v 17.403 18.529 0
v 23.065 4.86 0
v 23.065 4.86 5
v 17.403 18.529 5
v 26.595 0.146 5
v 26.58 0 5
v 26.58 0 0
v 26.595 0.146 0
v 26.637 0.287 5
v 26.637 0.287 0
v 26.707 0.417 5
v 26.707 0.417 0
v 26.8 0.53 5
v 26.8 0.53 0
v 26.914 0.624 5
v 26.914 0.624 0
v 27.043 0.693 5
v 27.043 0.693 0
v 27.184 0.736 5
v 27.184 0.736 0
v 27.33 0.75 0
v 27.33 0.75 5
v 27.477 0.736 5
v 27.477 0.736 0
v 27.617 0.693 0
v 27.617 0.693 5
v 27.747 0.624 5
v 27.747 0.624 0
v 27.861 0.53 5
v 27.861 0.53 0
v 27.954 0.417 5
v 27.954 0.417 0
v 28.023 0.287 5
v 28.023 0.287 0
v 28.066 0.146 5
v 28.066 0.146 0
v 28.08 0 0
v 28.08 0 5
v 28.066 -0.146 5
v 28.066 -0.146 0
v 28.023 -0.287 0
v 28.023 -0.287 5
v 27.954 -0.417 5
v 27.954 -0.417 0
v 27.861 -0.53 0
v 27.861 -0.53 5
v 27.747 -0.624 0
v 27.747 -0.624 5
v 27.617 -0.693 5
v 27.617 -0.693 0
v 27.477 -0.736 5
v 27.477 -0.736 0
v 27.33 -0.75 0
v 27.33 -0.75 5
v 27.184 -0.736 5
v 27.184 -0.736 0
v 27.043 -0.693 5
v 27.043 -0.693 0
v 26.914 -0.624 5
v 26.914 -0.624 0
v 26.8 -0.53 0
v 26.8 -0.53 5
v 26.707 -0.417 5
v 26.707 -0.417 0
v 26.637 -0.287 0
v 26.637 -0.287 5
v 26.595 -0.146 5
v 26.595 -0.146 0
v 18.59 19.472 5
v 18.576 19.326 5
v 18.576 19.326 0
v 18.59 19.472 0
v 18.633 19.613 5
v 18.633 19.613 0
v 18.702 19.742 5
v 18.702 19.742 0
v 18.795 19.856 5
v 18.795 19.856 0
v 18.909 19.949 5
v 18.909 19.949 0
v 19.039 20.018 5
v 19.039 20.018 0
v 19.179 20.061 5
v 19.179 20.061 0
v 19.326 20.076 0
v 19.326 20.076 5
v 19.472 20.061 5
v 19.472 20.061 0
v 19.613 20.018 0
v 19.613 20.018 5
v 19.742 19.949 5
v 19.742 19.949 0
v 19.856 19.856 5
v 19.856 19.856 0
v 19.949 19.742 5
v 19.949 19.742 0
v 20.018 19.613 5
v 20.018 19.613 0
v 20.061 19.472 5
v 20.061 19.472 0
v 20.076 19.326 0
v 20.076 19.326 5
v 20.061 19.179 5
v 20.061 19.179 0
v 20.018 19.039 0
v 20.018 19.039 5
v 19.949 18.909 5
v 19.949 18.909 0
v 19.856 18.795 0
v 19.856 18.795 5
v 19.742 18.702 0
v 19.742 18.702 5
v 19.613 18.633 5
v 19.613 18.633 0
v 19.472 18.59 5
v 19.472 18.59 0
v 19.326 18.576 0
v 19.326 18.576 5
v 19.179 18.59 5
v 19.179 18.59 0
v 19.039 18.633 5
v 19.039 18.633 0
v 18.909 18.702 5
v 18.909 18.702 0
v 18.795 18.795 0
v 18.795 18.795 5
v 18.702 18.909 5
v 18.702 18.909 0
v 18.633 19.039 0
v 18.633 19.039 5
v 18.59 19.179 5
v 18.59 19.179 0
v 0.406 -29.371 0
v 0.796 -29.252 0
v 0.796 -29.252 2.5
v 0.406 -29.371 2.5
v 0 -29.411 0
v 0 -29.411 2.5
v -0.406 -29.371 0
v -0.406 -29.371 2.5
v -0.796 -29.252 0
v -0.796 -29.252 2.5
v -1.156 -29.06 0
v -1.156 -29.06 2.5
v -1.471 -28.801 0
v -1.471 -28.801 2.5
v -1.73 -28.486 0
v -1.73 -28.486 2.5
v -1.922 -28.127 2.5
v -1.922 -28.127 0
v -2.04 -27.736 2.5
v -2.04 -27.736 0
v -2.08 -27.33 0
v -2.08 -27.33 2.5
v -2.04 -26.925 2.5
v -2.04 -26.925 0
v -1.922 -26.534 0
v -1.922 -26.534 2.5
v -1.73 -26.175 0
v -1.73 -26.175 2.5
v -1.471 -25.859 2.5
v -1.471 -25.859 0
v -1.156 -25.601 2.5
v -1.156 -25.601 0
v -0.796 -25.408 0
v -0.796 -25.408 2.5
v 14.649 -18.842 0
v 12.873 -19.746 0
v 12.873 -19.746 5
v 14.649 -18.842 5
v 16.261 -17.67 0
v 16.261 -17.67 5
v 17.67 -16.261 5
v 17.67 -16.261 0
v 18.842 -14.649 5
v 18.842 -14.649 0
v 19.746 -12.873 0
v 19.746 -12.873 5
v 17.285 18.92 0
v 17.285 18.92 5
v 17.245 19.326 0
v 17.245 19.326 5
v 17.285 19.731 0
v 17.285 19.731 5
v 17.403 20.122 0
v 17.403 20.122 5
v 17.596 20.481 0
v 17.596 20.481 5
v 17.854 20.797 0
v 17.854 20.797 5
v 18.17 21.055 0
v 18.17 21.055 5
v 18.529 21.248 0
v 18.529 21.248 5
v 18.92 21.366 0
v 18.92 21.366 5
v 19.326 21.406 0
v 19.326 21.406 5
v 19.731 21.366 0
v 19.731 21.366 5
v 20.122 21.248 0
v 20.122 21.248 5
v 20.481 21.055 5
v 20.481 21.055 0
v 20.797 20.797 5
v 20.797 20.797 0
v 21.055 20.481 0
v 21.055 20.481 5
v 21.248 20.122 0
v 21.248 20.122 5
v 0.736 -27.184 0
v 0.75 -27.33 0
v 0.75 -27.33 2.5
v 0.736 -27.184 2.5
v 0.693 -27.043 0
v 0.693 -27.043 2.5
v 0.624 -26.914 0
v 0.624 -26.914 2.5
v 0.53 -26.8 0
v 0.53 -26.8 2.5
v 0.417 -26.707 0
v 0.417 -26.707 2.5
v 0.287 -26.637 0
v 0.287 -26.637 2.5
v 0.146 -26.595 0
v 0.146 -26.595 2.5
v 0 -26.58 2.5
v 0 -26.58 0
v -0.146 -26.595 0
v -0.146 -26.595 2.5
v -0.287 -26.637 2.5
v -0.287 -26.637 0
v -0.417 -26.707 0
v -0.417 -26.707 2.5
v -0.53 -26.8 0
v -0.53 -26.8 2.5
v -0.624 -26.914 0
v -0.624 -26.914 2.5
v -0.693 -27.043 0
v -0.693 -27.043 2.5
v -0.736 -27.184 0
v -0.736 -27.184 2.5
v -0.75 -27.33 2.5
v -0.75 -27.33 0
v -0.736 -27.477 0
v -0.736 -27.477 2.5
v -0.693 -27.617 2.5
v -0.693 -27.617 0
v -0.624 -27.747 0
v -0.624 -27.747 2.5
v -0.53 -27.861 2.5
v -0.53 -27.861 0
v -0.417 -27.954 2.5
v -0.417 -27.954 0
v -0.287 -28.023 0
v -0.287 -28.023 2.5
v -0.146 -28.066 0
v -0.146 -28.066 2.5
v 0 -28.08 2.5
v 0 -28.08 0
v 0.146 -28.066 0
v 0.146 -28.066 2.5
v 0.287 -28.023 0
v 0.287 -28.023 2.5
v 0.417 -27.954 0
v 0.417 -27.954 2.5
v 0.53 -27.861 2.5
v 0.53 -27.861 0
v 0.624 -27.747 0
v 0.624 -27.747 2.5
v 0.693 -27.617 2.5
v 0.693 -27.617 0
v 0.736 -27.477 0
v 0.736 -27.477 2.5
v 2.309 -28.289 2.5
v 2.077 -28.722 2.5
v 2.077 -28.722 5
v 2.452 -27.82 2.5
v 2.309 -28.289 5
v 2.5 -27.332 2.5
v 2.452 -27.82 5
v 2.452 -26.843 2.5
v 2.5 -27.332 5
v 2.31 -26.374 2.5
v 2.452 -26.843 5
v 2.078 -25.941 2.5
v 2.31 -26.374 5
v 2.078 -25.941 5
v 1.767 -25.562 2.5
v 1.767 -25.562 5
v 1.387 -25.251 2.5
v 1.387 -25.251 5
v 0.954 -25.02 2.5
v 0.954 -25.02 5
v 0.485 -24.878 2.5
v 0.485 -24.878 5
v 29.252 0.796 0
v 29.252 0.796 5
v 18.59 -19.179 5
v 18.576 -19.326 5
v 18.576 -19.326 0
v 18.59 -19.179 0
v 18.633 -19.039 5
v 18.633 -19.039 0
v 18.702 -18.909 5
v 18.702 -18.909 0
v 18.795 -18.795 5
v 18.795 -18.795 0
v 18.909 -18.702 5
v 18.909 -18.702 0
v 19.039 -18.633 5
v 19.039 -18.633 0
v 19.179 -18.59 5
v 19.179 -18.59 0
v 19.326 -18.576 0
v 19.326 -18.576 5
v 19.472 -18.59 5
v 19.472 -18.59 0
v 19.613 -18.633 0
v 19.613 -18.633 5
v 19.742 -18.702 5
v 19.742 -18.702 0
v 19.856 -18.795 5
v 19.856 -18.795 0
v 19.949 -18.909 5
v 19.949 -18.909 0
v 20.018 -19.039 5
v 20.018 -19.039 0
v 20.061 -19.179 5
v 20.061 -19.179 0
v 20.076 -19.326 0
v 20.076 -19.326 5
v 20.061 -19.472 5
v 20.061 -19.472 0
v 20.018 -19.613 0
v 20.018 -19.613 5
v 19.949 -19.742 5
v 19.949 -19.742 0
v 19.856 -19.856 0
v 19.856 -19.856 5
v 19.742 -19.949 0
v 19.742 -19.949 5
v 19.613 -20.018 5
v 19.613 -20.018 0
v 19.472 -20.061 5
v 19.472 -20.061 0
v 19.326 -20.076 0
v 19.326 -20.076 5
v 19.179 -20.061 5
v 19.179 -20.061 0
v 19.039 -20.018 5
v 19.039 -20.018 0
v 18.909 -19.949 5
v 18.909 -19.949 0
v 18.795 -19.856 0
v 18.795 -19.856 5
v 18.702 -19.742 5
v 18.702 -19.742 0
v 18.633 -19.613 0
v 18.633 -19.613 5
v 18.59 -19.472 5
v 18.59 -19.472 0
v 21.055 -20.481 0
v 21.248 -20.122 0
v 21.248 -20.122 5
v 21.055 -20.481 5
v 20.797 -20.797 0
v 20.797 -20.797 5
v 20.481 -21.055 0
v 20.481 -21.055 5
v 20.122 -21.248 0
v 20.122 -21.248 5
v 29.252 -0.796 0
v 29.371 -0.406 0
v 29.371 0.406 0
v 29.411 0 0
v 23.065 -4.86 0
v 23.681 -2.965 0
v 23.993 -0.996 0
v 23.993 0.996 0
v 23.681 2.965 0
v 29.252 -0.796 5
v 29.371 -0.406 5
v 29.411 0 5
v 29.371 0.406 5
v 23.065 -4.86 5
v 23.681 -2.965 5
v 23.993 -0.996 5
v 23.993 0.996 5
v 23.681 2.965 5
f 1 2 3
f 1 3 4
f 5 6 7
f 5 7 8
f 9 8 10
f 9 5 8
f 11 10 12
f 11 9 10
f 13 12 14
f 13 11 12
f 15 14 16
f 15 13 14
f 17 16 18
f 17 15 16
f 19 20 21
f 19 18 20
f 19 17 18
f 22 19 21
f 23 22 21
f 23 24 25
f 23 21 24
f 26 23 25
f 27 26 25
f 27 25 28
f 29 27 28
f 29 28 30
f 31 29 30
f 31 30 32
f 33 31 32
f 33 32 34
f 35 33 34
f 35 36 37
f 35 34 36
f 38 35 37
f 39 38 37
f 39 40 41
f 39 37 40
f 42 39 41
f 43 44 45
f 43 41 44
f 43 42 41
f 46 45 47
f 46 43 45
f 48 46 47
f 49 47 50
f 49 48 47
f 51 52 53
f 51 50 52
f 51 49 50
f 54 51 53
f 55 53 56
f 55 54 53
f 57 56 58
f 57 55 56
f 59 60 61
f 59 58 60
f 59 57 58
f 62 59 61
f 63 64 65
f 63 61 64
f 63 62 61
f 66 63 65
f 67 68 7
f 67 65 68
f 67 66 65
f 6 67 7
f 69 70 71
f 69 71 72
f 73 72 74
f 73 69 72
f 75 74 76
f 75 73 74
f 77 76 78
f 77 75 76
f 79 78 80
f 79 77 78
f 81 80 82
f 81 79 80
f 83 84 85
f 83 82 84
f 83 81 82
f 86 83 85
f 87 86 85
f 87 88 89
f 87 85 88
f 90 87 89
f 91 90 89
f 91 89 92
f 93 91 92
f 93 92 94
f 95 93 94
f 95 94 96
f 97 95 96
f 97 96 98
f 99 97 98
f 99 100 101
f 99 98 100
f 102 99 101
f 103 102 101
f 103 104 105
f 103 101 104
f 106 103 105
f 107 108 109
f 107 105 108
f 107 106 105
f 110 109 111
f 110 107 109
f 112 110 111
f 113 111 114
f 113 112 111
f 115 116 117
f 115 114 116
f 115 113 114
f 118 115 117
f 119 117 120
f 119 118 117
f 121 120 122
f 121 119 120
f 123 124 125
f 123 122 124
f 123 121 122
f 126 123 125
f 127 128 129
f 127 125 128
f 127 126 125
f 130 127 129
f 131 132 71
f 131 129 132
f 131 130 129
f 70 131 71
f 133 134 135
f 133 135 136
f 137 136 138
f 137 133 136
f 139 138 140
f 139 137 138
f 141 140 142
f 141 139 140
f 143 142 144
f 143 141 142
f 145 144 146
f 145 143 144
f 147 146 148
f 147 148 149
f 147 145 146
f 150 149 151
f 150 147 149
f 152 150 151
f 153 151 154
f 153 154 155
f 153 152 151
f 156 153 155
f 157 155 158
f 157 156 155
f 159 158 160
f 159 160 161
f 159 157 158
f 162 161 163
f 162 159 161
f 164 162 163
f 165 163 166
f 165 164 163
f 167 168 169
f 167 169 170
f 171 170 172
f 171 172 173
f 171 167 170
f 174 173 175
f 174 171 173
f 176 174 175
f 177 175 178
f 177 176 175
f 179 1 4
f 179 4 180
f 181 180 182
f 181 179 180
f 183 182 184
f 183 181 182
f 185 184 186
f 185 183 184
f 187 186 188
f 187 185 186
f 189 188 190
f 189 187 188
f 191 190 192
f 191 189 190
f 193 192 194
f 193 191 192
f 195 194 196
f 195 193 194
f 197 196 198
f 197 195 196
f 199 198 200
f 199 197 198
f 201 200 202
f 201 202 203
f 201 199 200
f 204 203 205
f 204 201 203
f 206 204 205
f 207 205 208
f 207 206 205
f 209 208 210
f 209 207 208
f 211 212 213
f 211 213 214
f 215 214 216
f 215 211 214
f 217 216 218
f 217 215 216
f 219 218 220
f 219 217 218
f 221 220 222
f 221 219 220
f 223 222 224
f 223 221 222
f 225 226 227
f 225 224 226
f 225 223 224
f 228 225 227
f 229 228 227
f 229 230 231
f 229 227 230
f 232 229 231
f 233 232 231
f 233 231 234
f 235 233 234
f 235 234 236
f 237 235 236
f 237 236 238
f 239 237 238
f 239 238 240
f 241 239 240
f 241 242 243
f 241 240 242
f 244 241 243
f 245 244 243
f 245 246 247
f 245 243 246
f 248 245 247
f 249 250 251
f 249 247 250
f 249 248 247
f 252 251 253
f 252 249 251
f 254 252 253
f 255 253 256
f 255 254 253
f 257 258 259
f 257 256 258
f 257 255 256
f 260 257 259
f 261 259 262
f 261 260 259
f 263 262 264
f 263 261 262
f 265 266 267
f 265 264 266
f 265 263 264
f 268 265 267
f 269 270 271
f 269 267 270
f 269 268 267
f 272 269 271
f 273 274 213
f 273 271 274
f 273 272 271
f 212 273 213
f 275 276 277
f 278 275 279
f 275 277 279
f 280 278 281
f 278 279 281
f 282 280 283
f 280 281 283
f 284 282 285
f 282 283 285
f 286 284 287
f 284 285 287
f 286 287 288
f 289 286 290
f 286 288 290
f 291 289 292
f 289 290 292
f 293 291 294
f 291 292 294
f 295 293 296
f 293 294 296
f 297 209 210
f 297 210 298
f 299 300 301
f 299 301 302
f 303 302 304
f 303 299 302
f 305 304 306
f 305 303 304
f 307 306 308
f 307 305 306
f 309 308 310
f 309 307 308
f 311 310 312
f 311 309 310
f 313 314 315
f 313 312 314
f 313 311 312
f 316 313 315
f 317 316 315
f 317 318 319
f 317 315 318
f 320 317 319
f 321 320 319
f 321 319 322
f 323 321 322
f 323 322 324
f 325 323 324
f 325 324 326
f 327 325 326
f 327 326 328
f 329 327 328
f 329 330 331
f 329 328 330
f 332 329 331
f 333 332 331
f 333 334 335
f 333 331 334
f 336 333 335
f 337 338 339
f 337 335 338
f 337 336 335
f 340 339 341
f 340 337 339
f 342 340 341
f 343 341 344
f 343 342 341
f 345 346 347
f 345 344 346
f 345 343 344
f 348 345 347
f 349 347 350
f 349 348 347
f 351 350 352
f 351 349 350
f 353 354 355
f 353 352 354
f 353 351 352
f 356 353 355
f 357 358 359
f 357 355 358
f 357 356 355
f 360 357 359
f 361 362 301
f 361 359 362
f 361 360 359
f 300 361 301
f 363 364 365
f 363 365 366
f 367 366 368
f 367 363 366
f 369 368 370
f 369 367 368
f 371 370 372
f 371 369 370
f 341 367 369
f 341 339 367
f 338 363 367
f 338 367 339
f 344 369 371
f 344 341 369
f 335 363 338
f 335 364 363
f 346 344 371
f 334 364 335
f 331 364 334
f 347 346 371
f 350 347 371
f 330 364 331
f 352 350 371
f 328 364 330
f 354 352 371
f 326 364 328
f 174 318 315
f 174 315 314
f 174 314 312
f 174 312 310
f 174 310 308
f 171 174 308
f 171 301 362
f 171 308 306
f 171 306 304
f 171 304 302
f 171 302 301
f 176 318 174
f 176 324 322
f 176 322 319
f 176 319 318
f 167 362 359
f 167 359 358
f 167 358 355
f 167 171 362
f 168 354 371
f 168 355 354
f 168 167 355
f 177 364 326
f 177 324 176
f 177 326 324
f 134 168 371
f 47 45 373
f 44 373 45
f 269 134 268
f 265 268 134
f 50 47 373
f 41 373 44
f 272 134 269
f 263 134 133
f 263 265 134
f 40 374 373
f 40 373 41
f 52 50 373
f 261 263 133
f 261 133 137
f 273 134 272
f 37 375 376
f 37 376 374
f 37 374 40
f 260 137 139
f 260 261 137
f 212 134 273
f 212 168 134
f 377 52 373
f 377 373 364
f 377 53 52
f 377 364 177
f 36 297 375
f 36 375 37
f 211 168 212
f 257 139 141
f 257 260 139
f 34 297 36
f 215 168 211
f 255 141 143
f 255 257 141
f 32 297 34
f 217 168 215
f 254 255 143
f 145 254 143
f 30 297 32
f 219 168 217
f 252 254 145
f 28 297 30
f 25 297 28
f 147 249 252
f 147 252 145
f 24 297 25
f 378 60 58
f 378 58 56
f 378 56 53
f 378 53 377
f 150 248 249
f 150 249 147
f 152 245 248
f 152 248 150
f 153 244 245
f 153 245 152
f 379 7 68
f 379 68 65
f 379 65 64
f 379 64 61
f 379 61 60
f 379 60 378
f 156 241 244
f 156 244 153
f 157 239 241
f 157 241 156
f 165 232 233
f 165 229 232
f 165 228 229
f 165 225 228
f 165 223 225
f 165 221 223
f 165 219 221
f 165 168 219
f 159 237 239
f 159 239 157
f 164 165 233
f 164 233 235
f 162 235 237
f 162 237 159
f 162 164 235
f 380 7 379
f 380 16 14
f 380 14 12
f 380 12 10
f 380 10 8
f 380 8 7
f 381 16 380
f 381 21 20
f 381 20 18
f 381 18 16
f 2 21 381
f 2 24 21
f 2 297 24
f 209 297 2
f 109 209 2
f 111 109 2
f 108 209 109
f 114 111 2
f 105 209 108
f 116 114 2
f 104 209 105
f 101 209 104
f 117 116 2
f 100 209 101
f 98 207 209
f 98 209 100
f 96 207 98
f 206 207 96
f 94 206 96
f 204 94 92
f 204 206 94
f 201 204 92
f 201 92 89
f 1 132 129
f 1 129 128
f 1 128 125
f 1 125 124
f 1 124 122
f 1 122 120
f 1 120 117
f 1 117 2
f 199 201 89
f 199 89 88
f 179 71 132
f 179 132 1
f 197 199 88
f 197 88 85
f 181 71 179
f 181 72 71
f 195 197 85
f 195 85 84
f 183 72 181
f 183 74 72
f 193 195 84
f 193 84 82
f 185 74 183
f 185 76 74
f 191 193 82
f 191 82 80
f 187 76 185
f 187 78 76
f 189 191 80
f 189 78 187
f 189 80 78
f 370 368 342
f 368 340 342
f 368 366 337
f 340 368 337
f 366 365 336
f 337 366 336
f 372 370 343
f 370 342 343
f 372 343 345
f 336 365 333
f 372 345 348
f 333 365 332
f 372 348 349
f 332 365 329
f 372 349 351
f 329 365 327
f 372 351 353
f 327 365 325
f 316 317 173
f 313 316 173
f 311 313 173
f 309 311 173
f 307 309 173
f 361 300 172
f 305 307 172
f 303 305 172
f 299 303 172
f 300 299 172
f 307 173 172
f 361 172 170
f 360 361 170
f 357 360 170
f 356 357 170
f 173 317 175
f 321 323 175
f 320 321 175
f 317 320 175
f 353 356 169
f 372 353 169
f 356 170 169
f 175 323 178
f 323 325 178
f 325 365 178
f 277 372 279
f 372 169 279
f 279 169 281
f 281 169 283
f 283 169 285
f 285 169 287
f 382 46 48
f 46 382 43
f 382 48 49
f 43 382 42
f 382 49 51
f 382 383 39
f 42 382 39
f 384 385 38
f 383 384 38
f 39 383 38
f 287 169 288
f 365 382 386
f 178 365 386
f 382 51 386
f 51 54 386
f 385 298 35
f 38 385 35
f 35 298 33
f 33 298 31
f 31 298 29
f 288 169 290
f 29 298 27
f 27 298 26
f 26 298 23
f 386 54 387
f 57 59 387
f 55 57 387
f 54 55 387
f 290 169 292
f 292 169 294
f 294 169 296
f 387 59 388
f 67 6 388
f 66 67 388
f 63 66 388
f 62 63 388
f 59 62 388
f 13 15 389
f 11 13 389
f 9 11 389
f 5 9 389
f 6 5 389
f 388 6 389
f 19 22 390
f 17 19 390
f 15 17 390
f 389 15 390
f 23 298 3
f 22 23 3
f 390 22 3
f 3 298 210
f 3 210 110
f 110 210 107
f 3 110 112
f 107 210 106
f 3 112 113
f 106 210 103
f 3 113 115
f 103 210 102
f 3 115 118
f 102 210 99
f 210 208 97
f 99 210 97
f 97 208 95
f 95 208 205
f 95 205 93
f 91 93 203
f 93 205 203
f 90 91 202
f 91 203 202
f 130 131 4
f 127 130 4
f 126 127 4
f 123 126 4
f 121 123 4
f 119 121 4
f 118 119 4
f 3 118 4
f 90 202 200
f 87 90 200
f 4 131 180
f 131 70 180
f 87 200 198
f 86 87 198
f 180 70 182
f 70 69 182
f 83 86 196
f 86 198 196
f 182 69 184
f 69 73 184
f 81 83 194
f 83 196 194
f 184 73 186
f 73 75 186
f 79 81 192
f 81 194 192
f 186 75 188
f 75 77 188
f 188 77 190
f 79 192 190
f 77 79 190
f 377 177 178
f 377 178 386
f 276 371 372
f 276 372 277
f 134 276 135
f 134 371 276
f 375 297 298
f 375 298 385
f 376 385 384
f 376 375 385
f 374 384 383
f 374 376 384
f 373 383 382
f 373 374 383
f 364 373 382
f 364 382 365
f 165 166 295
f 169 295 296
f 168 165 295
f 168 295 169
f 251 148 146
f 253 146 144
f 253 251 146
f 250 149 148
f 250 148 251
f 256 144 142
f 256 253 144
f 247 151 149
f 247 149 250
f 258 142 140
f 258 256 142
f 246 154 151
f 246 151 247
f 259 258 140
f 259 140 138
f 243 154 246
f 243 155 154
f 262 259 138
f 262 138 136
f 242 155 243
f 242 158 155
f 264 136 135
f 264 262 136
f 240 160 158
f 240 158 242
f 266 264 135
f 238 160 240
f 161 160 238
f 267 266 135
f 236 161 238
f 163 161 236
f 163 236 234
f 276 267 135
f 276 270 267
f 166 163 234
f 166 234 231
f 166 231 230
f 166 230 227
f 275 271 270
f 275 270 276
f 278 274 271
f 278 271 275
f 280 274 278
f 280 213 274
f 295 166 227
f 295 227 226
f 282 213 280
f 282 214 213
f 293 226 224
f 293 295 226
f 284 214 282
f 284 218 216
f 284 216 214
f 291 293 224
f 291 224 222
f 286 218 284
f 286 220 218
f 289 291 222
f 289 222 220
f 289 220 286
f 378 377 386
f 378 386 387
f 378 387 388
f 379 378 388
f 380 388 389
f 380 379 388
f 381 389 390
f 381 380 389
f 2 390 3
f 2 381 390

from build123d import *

# Parameters (mm, degrees)
BOSS_EXTRUDE1_DEPTH     = 5
SKETCH2_R               = 2.5
CUT_EXTRUDE1_DEPTH      = 2.5
CUT_EXTRUDE2_DEPTH      = 42.668225696
CUT_EXTRUDE2_DEPTH_BACK = 42.668225696
SKETCH3_R               = 0.75
CUT_EXTRUDE3_DEPTH      = 42.892613104
CUT_EXTRUDE3_DEPTH_BACK = 42.892613104
SKETCH4_R               = 0.75


with BuildPart() as part:
    # Sketch1 → Boss-Extrude1 (new body)
    with BuildSketch(Plane.XY):
        with BuildLine():
            Line((21.247555139, 20.121649117), (29.252444861, 0.796135783))
            ThreePointArc((29.252444861, 0.796135783), (29.410806115, 0), (29.252444861, -0.796135783))
            Line((29.252444861, -0.796135783), (21.247555139, -20.121649117))
            ThreePointArc((21.247555139, -20.121649117), (20.796580444, -20.796580444), (20.121649117, -21.247555139))
            Line((20.121649117, -21.247555139), (0.796135783, -29.252444861))
            ThreePointArc((0.796135783, -29.252444861), (-1.922041804, -28.12653884), (-0.796135783, -25.408361253))
            Line((-0.796135783, -25.408361253), (12.873162178, -19.74635265))
            ThreePointArc((12.873162178, -19.74635265), (16.993338708, -16.993338708), (19.74635265, -12.873162178))
            Line((19.74635265, -12.873162178), (23.065480134, -4.860079591))
            ThreePointArc((23.065480134, -4.860079591), (24.032210071, 0), (23.065480134, 4.860079591))
            Line((23.065480134, 4.860079591), (17.40347153, 18.529377552))
            ThreePointArc((17.40347153, 18.529377552), (18.529377552, 21.247555139), (21.247555139, 20.121649117))
        make_face()
    extrude(amount=BOSS_EXTRUDE1_DEPTH)

    # Sketch2 → Cut-Extrude1 (cut)
    with BuildSketch(Plane.XY.offset(5)):
        with Locations((0, -27.330403057)):
            Circle(SKETCH2_R)
    extrude(amount=-CUT_EXTRUDE1_DEPTH, mode=Mode.SUBTRACT)

    # Sketch3 → Cut-Extrude2 (cut, two sides: drawn at the far end of the back side and taken through both)
    with BuildSketch(Plane.XY.offset(2.5).offset(-CUT_EXTRUDE2_DEPTH_BACK)):
        with Locations((0, -27.330403057)):
            Circle(SKETCH3_R)
    extrude(amount=CUT_EXTRUDE2_DEPTH + CUT_EXTRUDE2_DEPTH_BACK, mode=Mode.SUBTRACT)

    # Sketch4 → Cut-Extrude3 (cut, two sides: drawn at the far end of the back side and taken through both)
    with BuildSketch(Plane(origin=(0, 0, 0), x_dir=(-1, 0, 0), z_dir=(0, 0, -1)).offset(-CUT_EXTRUDE3_DEPTH_BACK)):
        with Locations((-19.325513334, 19.325513334)):
            Circle(SKETCH4_R)
        with Locations((-27.330403057, 0)):
            Circle(SKETCH4_R)
        with Locations((-19.325513334, -19.325513334)):
            Circle(SKETCH4_R)
    extrude(amount=CUT_EXTRUDE3_DEPTH + CUT_EXTRUDE3_DEPTH_BACK, mode=Mode.SUBTRACT)


solid = part.part
